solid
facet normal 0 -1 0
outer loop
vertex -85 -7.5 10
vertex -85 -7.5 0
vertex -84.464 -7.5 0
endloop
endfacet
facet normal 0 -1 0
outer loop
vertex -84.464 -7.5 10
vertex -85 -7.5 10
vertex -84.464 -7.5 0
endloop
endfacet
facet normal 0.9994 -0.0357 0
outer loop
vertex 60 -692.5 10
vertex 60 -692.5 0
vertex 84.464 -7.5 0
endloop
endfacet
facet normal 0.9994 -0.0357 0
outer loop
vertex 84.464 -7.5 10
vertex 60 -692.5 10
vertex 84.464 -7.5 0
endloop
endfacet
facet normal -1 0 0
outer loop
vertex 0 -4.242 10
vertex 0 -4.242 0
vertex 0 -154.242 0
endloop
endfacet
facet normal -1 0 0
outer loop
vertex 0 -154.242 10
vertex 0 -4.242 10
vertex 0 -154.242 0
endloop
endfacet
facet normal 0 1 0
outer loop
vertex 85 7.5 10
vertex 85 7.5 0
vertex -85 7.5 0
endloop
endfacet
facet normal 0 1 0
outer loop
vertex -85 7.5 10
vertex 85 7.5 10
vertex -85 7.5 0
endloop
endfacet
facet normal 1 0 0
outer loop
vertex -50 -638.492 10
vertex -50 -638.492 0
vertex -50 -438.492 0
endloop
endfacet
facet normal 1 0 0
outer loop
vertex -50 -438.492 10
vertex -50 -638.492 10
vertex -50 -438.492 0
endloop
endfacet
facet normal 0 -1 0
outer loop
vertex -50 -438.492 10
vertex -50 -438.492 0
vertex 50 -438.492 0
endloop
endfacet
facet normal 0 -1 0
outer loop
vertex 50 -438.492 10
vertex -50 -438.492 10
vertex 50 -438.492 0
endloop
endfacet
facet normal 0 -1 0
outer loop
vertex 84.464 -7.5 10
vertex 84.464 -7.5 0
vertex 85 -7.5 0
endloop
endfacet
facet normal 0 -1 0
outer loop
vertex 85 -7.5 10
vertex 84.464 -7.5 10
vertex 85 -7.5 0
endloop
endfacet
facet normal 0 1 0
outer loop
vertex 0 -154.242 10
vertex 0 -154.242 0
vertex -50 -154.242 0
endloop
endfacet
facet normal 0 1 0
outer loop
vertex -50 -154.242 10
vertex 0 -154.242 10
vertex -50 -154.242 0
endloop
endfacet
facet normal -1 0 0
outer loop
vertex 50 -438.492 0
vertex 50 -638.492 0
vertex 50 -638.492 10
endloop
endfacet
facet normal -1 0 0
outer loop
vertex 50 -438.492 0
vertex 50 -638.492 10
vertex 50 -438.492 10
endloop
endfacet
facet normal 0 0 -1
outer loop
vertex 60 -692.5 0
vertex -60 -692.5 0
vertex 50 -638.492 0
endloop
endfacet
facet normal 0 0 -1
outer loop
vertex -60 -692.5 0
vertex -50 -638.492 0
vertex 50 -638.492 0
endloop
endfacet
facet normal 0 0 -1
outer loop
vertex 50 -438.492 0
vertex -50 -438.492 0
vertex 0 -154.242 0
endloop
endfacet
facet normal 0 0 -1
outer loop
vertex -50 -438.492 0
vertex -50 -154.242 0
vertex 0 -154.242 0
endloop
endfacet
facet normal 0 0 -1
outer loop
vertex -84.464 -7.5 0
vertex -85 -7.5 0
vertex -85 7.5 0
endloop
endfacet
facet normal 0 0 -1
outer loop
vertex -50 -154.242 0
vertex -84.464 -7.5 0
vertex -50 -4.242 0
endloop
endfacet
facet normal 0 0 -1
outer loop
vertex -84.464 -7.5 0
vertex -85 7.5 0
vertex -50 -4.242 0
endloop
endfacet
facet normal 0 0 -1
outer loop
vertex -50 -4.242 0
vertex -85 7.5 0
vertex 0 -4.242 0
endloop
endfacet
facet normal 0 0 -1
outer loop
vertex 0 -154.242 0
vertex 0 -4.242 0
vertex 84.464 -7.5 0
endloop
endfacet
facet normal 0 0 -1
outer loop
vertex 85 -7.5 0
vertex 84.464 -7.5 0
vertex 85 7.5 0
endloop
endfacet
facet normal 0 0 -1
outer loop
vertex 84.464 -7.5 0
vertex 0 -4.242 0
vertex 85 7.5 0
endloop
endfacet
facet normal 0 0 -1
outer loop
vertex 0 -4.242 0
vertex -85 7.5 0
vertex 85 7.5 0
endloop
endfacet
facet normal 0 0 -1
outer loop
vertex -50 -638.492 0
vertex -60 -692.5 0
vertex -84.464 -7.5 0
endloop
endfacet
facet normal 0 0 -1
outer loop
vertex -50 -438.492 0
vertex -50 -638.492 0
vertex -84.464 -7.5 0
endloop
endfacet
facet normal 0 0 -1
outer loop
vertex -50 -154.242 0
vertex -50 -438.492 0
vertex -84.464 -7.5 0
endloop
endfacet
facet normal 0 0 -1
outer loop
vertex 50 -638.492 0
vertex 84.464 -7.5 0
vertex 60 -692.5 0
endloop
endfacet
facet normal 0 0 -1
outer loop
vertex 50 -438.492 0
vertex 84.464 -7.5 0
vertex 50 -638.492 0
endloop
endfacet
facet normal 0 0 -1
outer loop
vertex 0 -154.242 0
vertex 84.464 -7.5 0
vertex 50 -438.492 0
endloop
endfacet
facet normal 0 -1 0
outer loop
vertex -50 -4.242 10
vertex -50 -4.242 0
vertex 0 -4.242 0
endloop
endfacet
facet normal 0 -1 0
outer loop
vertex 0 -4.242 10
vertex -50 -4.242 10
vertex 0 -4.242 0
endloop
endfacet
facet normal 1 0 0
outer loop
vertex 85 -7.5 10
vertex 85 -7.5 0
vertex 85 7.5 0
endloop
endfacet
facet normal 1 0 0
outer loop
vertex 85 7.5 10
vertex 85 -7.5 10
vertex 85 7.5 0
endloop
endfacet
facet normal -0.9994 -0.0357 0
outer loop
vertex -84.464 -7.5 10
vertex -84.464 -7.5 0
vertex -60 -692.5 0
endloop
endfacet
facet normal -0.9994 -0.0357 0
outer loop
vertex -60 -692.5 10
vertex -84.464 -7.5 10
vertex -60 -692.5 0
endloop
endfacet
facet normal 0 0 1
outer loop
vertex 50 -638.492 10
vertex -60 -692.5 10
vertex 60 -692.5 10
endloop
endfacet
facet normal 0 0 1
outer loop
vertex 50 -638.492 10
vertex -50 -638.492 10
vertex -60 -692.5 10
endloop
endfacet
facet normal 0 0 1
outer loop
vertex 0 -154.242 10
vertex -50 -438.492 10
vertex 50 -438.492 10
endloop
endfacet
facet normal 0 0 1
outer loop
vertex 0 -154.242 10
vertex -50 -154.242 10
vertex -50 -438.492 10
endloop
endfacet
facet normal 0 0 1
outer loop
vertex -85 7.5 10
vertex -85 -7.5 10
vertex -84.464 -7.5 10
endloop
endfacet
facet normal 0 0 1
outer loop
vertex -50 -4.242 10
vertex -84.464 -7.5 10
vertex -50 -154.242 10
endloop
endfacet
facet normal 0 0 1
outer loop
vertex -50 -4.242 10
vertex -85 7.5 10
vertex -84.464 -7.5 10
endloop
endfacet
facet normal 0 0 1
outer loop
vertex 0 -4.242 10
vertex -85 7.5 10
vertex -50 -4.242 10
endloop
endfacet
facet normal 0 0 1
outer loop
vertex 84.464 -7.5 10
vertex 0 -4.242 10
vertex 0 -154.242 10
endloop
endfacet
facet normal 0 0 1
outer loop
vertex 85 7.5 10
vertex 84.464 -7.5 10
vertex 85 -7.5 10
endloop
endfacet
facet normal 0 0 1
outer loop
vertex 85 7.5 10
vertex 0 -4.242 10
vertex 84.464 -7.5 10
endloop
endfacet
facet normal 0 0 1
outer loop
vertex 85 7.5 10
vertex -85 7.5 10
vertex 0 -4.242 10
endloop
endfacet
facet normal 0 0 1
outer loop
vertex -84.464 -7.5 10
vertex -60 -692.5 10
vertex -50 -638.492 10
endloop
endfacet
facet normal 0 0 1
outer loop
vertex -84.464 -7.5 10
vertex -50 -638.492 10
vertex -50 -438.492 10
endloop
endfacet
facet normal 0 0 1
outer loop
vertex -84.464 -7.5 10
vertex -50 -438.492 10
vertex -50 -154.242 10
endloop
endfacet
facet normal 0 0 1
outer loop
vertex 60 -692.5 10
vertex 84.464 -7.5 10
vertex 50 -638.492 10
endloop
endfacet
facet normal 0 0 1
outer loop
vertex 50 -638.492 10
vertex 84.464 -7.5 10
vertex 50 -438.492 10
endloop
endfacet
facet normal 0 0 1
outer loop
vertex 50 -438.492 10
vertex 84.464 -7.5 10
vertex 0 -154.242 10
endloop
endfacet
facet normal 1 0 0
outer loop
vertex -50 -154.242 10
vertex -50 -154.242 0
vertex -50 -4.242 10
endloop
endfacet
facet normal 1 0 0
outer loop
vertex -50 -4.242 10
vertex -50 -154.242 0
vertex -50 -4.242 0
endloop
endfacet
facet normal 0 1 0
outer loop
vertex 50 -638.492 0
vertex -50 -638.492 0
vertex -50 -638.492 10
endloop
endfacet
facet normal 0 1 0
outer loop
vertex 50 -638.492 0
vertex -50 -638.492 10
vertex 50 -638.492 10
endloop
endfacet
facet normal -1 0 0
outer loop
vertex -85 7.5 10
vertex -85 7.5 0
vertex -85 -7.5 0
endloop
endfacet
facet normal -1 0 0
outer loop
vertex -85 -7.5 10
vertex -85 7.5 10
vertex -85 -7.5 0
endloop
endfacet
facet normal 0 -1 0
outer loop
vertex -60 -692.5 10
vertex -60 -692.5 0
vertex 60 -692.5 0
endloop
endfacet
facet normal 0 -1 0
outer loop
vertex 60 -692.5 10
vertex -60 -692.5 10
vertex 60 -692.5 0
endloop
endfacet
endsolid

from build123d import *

# Parameters (mm, degrees)
F0_W     = 100
F0_H     = 200
F0_W_2   = 120
F0_H_2   = 21.92845
F1_DEPTH = 10


with BuildPart() as f1:
    # F0 (on Top) → F1 (new body)
    with BuildSketch(Plane.XY):
        Polygon((84.464286, -7.5), (85, -7.5), (85, 7.5), align=None)
        Polygon((60, -692.5), (84.464286, -7.5), (0, -7.5), (0, -154.242083), (-50, -154.242083), (-50, -7.5), (-84.464286, -7.5), (-60, -692.5), (-60, -670.57155), (60, -670.57155), align=None)
        with Locations((0, -538.492203)):
            Rectangle(F0_W, F0_H, mode=Mode.SUBTRACT)
        Polygon((0, -7.5), (84.464286, -7.5), (85, 7.5), (-85, 7.5), (-84.464286, -7.5), (-50, -7.5), (-50, -4.242083), (0, -4.242083), align=None)
        with Locations((0, -681.535775)):
            Rectangle(F0_W_2, F0_H_2)
        Polygon((-84.464286, -7.5), (-85, 7.5), (-85, -7.5), align=None)
    extrude(amount=F1_DEPTH)


solid = f1.part
